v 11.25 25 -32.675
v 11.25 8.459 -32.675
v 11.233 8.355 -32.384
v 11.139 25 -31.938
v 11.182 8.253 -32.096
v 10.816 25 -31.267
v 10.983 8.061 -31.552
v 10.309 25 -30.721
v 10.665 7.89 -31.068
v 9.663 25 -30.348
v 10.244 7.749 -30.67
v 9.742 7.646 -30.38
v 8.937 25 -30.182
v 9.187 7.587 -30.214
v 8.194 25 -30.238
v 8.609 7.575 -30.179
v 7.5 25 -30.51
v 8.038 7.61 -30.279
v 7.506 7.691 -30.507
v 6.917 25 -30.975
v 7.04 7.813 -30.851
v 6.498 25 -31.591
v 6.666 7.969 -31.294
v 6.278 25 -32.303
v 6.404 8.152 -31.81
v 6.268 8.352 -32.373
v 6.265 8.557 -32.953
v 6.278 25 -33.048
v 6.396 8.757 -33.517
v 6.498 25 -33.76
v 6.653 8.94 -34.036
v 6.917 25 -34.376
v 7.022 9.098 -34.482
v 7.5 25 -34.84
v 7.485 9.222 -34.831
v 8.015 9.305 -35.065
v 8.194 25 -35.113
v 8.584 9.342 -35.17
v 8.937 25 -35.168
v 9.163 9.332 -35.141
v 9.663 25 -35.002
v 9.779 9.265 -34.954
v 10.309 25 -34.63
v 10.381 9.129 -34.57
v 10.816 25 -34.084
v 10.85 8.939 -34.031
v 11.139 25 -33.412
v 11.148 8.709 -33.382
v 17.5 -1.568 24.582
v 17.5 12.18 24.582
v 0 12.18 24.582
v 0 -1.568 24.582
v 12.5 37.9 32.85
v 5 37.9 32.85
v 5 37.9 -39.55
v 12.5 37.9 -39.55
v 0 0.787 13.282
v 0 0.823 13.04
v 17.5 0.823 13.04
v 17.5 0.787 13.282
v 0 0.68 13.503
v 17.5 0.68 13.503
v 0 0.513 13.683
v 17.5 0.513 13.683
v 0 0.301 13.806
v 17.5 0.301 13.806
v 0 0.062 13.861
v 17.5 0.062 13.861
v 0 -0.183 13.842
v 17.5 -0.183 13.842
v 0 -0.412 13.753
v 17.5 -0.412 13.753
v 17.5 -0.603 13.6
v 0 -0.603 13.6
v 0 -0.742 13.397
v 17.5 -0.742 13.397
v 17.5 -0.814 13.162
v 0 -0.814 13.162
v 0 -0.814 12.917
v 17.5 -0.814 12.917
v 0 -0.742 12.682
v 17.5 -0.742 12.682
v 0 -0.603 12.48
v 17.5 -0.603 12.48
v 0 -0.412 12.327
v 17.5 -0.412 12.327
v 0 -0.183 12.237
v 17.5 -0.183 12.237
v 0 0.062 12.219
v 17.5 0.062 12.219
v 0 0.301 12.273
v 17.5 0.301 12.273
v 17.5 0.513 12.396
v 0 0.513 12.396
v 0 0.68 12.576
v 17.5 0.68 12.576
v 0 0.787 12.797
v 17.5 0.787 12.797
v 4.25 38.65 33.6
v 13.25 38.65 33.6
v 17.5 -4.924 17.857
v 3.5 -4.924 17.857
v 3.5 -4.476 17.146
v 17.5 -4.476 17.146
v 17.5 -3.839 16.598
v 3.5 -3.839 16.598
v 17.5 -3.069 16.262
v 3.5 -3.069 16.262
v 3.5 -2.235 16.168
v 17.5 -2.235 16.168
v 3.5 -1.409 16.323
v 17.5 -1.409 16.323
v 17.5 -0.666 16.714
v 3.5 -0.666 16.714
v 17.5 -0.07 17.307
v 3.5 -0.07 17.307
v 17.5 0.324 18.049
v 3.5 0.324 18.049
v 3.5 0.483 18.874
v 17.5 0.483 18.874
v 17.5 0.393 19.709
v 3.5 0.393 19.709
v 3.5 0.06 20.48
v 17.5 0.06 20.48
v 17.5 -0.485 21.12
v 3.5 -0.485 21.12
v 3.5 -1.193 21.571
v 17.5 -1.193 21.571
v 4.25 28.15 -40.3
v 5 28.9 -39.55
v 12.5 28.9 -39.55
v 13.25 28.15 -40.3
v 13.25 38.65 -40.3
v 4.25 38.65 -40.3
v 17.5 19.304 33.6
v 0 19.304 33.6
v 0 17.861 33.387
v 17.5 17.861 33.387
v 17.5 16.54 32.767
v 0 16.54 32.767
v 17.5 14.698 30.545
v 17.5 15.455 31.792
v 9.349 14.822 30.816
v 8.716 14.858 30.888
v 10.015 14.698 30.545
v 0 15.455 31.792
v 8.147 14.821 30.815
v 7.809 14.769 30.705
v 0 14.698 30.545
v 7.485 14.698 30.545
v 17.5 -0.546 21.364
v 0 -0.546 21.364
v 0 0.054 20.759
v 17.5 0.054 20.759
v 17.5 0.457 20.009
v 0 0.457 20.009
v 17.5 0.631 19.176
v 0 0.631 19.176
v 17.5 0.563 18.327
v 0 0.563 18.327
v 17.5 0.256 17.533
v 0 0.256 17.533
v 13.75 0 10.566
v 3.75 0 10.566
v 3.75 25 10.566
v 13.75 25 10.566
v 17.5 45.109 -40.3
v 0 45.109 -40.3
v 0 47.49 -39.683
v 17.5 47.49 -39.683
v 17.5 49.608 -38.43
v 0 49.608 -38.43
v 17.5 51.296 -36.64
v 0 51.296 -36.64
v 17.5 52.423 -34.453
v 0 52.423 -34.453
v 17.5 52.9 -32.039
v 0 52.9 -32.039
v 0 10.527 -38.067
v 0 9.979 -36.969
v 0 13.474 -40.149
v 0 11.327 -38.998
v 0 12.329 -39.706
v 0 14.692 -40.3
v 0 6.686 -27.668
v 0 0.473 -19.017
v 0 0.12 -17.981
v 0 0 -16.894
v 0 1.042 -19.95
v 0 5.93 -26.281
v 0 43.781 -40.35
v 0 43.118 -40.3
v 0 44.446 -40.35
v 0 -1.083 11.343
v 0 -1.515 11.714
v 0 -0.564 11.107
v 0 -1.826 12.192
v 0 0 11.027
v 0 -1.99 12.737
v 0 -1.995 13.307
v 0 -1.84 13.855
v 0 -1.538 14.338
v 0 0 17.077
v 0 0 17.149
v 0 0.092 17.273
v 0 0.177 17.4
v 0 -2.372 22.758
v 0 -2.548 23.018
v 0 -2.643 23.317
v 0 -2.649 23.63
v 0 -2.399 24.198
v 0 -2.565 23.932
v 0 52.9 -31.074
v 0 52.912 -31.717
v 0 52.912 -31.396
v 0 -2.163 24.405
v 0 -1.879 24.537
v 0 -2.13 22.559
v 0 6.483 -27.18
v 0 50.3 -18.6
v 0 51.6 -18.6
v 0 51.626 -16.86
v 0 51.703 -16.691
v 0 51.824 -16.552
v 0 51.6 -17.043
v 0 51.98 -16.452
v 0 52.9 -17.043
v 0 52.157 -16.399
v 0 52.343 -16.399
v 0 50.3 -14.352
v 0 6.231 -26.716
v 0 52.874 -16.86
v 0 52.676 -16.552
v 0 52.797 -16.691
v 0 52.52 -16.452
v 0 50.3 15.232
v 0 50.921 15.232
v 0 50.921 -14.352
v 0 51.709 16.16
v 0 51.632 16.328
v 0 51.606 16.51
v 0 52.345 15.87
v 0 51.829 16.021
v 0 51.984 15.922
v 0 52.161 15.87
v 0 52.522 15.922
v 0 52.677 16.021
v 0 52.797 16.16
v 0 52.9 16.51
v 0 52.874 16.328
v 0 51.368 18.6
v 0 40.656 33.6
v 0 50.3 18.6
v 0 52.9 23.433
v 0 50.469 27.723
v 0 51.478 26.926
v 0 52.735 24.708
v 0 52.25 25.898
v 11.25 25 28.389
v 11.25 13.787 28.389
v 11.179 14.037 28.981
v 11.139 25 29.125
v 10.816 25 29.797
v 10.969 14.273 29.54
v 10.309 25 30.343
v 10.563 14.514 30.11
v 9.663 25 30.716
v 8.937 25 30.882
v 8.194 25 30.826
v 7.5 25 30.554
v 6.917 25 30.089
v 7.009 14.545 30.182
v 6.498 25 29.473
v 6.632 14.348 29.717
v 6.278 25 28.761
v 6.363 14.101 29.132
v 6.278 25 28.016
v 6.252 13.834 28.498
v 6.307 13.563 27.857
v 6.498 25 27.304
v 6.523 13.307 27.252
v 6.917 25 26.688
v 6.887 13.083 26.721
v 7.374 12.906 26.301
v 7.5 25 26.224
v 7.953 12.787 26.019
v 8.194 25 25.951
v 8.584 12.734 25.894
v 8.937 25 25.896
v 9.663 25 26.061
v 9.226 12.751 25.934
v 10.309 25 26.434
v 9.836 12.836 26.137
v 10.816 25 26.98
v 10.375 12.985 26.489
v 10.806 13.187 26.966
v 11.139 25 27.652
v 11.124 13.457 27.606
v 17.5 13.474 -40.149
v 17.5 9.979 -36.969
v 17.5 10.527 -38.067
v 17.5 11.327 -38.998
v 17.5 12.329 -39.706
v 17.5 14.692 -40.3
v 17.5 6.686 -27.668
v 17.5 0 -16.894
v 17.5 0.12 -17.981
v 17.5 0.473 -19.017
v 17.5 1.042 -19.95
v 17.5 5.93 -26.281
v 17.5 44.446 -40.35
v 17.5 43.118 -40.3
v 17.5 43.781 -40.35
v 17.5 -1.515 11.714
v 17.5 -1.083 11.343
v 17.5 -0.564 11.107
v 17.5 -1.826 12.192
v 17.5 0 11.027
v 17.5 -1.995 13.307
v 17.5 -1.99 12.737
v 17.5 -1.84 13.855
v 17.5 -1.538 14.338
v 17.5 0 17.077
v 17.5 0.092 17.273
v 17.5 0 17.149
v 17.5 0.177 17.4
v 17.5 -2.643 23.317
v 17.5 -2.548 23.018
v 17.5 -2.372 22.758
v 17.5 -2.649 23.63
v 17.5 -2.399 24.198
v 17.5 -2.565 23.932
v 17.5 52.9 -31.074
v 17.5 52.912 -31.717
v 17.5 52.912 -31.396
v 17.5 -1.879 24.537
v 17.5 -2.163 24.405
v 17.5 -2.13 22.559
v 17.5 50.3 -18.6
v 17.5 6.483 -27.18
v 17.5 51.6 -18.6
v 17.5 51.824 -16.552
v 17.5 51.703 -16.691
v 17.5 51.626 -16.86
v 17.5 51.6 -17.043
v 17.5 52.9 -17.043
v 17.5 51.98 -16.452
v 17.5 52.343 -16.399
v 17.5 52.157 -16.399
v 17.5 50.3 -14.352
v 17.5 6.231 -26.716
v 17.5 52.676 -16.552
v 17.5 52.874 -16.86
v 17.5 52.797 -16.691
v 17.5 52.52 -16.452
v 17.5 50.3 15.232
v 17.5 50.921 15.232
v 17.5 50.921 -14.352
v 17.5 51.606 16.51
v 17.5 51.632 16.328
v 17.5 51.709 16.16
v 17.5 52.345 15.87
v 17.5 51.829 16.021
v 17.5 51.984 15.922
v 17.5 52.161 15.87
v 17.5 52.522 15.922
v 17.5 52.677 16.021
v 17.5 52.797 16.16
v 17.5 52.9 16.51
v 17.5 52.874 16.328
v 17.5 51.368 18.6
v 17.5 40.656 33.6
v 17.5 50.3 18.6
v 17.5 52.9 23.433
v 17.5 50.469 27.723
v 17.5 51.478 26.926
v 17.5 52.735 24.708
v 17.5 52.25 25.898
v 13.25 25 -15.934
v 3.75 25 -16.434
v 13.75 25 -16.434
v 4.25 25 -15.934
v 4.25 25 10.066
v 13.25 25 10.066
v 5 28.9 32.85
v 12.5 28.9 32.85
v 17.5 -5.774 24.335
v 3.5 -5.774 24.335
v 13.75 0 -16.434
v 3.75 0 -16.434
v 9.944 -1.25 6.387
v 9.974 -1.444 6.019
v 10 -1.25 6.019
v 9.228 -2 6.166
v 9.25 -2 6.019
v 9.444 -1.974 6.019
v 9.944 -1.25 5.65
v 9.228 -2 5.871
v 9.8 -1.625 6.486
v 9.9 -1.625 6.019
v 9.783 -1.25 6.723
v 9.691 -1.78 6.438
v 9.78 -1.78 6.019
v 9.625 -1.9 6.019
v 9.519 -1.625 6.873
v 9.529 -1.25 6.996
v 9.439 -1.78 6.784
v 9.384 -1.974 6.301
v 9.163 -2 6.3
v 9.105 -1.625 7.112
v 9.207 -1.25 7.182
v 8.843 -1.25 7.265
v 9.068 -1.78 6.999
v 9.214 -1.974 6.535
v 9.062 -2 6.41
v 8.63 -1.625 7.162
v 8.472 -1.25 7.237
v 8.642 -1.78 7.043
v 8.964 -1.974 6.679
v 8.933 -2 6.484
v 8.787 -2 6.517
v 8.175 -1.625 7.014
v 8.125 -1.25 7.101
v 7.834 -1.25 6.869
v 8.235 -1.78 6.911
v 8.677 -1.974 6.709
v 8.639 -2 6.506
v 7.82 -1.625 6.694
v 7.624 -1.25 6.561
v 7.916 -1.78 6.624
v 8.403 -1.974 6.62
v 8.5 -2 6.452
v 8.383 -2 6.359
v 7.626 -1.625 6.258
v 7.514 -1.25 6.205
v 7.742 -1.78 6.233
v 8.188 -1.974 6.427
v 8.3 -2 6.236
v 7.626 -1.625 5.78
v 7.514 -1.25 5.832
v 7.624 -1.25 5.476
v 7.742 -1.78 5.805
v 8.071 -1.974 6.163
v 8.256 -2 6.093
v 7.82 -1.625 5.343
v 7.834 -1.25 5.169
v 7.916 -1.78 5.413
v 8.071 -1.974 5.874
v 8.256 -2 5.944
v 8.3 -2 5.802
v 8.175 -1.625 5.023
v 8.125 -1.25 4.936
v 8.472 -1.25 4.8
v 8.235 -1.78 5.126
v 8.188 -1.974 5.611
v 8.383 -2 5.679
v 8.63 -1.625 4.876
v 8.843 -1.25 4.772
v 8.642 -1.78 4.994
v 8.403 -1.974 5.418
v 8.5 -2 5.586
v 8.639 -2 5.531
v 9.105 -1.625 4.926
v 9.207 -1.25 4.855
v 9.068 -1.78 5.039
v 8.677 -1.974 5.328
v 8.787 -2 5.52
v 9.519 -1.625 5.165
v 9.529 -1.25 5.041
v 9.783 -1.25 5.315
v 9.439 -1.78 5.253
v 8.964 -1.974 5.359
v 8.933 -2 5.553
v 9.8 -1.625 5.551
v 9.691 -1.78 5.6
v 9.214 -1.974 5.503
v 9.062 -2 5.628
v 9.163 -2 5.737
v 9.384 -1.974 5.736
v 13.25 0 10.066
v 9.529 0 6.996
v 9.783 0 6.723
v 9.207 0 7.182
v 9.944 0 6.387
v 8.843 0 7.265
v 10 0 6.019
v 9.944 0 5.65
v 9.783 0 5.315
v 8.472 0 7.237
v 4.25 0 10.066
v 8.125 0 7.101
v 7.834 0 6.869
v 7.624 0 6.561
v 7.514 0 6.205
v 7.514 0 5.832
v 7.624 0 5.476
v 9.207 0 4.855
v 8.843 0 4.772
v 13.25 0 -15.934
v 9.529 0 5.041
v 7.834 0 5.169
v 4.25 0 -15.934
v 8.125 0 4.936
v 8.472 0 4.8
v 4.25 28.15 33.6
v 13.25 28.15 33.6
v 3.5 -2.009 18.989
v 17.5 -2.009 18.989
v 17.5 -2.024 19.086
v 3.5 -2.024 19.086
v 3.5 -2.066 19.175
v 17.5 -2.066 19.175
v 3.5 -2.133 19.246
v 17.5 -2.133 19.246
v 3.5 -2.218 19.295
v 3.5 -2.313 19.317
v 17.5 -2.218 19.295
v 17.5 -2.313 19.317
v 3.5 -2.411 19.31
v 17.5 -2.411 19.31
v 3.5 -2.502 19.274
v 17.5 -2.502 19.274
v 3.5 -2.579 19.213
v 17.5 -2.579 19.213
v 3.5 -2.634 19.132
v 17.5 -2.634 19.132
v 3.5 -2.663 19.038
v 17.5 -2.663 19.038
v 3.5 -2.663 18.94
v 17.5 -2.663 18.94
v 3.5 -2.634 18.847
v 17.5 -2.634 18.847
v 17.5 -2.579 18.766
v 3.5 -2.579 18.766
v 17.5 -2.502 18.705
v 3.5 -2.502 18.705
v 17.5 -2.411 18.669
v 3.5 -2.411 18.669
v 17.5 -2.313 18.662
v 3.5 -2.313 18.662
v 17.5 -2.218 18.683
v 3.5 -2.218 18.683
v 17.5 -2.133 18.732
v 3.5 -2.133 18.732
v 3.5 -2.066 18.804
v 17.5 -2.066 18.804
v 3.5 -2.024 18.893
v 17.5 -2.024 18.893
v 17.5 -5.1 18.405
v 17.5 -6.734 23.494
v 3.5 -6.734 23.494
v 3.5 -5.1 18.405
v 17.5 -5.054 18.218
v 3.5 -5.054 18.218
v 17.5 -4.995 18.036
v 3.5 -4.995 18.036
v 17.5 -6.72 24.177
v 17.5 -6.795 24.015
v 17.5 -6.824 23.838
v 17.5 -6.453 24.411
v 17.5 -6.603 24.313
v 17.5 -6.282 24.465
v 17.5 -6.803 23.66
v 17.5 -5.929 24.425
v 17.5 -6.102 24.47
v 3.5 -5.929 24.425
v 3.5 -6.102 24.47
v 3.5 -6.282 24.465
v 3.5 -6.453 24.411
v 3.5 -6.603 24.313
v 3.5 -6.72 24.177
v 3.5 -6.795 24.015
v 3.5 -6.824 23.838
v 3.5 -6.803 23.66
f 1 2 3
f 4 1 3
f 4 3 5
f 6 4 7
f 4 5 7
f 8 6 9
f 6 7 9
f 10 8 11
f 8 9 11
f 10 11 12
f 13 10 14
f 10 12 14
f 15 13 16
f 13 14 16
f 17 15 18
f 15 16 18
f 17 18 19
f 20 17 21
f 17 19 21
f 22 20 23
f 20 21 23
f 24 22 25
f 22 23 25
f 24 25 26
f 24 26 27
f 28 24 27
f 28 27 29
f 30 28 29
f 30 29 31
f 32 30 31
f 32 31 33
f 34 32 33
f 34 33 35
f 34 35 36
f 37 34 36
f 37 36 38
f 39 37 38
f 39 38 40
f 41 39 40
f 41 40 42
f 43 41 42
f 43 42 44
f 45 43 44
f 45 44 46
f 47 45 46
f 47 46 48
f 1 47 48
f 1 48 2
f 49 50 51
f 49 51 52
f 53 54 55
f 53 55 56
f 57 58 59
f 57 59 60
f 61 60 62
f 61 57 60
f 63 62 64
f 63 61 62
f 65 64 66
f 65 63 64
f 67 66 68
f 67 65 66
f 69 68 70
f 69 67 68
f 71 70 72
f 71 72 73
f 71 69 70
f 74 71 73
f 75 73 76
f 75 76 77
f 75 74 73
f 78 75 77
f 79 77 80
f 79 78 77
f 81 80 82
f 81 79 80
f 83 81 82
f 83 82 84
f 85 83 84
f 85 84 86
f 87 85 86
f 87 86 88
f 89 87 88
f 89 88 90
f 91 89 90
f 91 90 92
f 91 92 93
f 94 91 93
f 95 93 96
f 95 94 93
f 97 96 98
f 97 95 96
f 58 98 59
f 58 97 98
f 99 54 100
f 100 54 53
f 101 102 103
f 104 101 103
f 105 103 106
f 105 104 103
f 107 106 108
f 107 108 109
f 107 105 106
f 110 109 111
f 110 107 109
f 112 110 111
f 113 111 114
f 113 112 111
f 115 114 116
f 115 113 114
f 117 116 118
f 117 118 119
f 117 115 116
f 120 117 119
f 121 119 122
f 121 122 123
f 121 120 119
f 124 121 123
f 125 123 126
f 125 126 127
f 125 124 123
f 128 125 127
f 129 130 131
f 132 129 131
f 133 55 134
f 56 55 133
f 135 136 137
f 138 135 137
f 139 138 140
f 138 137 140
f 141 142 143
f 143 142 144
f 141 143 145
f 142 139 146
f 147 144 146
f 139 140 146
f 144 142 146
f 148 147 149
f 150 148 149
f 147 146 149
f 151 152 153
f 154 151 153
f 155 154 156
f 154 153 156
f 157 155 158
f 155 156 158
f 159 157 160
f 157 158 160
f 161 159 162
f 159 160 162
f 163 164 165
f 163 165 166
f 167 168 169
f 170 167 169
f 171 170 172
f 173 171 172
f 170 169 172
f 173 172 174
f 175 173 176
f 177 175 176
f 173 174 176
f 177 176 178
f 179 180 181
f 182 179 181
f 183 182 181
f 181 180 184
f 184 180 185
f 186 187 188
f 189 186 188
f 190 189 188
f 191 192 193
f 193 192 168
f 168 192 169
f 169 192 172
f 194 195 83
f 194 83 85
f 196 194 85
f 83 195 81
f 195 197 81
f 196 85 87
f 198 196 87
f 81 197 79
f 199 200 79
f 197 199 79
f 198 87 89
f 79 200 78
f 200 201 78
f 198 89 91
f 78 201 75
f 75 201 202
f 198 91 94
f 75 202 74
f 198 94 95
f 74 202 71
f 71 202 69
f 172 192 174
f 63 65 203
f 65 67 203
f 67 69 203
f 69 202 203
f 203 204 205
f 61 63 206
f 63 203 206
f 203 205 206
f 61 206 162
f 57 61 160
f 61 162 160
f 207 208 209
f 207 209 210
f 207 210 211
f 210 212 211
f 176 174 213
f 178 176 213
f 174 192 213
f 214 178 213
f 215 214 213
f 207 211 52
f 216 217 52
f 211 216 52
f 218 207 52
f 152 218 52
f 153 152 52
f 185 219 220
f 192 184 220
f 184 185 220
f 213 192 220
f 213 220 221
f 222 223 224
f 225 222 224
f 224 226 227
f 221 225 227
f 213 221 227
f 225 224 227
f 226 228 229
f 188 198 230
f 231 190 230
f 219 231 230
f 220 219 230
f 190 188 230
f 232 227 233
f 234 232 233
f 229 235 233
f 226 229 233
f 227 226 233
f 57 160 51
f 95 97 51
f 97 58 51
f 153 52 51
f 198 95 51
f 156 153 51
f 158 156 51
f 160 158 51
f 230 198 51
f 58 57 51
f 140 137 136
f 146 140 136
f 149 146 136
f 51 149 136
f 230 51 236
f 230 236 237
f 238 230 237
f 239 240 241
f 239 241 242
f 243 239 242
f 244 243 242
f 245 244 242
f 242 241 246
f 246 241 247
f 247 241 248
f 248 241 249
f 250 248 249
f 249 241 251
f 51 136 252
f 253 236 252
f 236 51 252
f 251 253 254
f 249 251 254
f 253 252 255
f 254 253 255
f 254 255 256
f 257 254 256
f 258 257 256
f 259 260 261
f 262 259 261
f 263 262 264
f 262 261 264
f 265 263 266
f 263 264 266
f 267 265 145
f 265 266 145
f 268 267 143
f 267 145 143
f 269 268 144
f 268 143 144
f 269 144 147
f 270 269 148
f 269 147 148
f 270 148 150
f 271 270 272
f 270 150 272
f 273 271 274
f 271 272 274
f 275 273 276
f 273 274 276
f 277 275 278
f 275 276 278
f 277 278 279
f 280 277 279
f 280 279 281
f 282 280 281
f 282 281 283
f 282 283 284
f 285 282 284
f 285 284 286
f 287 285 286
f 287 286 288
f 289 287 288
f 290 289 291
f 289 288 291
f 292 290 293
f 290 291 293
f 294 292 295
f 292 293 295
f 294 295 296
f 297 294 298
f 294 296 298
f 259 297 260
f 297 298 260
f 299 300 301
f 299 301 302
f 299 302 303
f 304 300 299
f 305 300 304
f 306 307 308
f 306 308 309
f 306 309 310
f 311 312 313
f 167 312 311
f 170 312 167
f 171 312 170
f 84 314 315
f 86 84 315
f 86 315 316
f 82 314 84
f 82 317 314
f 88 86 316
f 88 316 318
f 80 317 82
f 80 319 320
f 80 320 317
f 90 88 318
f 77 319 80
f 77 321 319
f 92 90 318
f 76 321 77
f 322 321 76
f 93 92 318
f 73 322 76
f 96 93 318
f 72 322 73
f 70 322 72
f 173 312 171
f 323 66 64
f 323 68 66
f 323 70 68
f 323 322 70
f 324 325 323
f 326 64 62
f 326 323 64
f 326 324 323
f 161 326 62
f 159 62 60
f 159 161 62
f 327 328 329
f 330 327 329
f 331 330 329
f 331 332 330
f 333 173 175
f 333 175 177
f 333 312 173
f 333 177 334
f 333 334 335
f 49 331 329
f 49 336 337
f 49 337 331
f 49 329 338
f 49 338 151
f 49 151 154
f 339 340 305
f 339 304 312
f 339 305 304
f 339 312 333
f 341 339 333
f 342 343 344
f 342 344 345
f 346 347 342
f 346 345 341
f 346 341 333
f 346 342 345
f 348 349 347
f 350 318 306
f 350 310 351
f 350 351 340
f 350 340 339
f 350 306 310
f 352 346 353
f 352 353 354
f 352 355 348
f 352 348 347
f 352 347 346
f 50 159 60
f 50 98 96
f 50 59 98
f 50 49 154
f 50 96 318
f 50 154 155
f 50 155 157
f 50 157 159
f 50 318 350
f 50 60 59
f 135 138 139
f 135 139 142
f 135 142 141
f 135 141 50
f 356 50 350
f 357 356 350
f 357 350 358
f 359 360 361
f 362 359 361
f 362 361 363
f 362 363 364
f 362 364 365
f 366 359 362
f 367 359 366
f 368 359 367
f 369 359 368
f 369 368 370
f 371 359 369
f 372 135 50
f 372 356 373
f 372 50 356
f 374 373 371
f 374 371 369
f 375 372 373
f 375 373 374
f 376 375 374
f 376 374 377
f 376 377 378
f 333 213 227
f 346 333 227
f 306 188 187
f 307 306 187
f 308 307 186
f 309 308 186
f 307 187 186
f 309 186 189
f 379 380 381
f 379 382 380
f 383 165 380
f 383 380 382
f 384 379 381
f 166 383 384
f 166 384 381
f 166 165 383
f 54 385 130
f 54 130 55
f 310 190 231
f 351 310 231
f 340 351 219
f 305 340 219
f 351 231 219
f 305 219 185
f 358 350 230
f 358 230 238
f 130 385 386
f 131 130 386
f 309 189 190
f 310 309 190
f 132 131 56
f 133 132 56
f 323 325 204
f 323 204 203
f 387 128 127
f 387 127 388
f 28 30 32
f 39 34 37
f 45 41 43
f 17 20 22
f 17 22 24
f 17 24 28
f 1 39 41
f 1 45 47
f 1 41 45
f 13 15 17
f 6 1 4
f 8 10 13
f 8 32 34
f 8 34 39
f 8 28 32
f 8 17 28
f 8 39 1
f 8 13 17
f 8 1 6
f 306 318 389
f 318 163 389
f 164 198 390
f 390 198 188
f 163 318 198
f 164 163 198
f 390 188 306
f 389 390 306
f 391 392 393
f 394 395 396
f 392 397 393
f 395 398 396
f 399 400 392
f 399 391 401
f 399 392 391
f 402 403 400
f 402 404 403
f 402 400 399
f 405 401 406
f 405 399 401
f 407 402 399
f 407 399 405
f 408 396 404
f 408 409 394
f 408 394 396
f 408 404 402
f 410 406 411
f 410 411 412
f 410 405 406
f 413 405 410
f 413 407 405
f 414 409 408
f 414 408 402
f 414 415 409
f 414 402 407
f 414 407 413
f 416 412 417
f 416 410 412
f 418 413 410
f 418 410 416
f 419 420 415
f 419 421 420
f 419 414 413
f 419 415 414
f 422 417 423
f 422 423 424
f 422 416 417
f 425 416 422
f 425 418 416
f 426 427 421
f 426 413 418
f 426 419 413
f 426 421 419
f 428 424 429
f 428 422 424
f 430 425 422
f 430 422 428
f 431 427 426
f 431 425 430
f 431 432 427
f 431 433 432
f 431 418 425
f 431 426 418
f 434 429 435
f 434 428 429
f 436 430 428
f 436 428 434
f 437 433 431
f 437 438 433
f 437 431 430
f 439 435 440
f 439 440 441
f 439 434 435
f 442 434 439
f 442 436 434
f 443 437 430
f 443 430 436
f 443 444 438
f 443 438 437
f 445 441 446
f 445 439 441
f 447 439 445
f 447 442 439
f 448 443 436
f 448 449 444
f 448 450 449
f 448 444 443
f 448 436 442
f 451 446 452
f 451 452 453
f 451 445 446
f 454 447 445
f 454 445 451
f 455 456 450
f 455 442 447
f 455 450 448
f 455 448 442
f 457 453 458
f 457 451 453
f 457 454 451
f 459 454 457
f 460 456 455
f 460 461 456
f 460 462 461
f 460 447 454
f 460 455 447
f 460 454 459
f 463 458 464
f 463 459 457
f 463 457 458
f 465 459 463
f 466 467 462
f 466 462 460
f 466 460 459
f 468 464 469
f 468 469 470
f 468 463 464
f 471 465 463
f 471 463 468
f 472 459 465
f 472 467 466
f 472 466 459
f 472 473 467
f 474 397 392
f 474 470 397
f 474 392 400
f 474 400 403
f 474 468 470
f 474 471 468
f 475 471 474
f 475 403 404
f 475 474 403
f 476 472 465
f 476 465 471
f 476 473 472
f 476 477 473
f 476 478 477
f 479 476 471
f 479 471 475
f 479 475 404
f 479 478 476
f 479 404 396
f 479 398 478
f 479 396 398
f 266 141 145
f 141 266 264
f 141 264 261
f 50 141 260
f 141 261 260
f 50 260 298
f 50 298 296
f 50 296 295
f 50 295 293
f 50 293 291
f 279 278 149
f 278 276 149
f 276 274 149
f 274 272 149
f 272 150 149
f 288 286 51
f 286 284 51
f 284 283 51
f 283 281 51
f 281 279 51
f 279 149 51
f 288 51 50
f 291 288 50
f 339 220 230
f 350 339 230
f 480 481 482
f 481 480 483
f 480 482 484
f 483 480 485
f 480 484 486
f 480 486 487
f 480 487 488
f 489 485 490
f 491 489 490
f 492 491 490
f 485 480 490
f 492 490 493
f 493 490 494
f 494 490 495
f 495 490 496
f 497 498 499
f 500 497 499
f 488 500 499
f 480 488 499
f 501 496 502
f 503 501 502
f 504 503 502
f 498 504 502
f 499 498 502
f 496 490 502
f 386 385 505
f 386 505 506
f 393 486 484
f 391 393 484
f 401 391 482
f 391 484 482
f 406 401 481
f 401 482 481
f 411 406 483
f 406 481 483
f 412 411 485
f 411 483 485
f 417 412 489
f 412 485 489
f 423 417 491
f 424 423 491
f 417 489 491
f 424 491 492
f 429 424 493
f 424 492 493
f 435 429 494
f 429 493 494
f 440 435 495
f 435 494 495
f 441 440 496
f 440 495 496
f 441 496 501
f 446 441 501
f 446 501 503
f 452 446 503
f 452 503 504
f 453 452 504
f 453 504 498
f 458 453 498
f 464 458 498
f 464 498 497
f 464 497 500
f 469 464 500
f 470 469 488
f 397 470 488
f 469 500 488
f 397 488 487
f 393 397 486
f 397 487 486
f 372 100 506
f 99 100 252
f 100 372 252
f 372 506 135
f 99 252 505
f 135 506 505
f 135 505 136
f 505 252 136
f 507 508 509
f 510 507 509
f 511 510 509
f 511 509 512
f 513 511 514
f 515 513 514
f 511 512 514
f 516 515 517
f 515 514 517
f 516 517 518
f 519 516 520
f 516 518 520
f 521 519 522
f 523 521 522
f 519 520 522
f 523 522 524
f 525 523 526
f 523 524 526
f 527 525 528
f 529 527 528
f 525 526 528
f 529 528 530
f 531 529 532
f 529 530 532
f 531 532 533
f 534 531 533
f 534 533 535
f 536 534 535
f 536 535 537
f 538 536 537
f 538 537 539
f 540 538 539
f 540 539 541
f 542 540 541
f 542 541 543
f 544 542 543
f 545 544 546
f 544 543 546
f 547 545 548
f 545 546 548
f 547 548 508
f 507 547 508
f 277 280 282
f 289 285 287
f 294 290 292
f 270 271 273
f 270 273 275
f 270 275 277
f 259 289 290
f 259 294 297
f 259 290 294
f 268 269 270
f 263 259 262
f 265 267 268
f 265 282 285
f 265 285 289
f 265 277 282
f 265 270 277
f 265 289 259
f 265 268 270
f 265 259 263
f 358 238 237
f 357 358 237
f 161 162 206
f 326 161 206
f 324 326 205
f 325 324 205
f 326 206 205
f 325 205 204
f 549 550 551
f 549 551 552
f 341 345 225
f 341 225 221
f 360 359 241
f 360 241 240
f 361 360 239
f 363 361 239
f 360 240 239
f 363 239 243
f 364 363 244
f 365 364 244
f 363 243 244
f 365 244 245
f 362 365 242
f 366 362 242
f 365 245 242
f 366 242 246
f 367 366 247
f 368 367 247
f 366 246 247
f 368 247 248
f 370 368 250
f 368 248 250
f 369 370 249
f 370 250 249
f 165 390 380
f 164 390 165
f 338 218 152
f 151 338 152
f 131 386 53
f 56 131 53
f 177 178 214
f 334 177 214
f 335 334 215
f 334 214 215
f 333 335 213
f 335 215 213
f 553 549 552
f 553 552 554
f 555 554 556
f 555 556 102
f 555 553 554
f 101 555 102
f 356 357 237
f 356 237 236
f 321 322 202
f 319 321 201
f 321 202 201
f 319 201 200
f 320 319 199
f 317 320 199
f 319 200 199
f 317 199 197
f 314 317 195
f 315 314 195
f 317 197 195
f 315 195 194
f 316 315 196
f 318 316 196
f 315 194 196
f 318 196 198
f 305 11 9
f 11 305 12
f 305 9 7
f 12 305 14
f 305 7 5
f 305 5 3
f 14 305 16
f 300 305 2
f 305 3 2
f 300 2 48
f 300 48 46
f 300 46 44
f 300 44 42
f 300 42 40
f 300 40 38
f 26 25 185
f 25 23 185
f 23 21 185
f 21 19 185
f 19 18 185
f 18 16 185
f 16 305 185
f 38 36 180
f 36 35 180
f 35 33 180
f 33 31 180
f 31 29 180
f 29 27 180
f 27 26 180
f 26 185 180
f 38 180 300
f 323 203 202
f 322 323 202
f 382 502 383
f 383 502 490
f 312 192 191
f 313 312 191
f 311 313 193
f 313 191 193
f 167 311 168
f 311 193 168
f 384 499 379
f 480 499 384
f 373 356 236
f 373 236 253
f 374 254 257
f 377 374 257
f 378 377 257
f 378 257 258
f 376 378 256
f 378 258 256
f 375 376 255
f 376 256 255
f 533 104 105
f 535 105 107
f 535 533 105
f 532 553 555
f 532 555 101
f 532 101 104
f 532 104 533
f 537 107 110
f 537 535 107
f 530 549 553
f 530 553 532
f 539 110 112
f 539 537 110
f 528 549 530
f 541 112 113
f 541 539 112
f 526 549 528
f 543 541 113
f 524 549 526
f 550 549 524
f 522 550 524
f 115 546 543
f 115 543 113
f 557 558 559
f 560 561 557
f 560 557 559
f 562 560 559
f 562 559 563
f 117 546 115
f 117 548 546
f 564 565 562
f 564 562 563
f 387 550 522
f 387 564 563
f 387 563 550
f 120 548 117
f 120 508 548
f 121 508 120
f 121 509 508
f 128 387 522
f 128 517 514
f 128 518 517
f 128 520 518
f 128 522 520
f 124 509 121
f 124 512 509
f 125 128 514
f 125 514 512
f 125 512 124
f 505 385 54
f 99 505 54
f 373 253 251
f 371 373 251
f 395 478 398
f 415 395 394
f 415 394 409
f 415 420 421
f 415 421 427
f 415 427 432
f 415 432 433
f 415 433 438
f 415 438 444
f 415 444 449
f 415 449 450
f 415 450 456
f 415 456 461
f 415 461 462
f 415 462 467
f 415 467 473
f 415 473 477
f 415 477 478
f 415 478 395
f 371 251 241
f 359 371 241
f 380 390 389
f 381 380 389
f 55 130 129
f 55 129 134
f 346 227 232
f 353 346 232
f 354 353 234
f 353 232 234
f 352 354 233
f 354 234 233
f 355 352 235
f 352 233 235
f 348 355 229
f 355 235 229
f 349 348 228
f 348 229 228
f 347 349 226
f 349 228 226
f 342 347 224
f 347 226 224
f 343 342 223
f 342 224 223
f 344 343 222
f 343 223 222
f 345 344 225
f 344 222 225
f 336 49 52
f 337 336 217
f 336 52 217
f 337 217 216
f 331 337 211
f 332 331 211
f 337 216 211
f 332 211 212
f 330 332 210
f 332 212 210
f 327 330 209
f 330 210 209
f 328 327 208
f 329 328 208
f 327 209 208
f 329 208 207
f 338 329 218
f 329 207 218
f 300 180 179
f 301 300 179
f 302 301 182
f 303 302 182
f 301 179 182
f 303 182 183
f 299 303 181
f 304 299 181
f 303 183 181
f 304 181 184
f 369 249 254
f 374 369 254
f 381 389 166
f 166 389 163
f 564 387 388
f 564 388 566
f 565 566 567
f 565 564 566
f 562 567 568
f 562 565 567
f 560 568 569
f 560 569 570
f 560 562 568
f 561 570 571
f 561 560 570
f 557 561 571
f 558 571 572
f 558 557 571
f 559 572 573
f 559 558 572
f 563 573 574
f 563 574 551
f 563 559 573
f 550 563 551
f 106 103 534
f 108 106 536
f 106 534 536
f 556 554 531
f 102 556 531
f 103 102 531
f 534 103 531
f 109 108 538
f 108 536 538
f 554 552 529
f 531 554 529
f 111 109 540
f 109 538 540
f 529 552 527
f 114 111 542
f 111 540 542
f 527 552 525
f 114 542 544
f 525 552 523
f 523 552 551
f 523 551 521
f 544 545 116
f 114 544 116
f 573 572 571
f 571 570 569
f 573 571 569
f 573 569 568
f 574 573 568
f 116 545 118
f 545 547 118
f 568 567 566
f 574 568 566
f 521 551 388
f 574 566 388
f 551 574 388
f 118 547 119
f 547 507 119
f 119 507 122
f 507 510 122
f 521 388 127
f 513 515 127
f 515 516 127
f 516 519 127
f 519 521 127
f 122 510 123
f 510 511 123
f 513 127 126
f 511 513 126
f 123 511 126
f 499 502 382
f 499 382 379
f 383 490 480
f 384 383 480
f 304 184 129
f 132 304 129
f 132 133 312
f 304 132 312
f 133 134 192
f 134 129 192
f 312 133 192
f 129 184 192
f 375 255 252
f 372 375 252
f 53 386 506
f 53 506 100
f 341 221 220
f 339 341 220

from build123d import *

# Parameters (mm, degrees)
F0_R      = 0.823257
F1_DEPTH  = 17.5
F2_R      = 0.328676
F3_DEPTH  = 14
F4_W      = 7.5
F4_H      = 9
F5_DEPTH  = 73.957461
F6_R      = 2.5
F7_DEPTH  = 25
F8_W      = 10
F8_H      = 27
F8_W_2    = 9
F8_H_2    = 26
F9_DEPTH  = 25
F10_R     = 1.25
F11_DEPTH = 2
F12_R     = 0.75
F13_SIZE  = 0.75


with BuildPart() as f1:
    # F0 (on Right) → F1 (new body)
    with BuildSketch(Plane.YZ):
        with BuildLine():
            Line((0, 11.026559), (0, 0))
            Line((0, 0), (0, -16.894456))
            ThreePointArc((0, -16.894456), (0.267738, -18.508672), (1.042278, -19.950014))
            Line((1.042278, -19.950014), (5.930145, -26.281039))
            ThreePointArc((5.930145, -26.281039), (6.363045, -26.944435), (6.685741, -27.667874))
            Line((6.685741, -27.667874), (9.978654, -36.968724))
            ThreePointArc((9.978654, -36.968724), (11.806111, -39.383113), (14.691972, -40.3))
            Line((14.691972, -40.3), (43.11803, -40.3))
            Line((43.11803, -40.3), (45.108521, -40.3))
            ThreePointArc((45.108521, -40.3), (50.515014, -37.594471), (52.9, -32.039123))
            Line((52.9, -32.039123), (52.9, -31.073859))
            Line((52.9, -31.073859), (52.9, -18.6))
            Line((52.9, -18.6), (51.6, -18.6))
            Line((51.6, -18.6), (50.3, -18.6))
            Line((50.3, -18.6), (50.3, -14.351867))
            Line((50.3, -14.351867), (50.921366, -14.351867))
            Line((50.921366, -14.351867), (50.921366, 15.232199))
            Line((50.921366, 15.232199), (50.3, 15.232199))
            Line((50.3, 15.232199), (50.3, 18.6))
            Line((50.3, 18.6), (51.368345, 18.6))
            Line((51.368345, 18.6), (51.606093, 16.510101))
            ThreePointArc((51.606093, 16.510101), (52.253046, 15.863147), (52.9, 16.510101))
            Line((52.9, 16.510101), (52.9, 23.433136))
            ThreePointArc((52.9, 23.433136), (52.250031, 25.898339), (50.469108, 27.722621))
            Line((50.469108, 27.722621), (40.656004, 33.6))
            Line((40.656004, 33.6), (19.304, 33.6))
            ThreePointArc((19.304, 33.6), (16.540417, 32.766846), (14.69783, 30.545043))
            Line((14.69783, 30.545043), (12.179947, 24.582295))
            Line((12.179947, 24.582295), (0, 24.582295))
            Line((0, 24.582295), (-1.568257, 24.582295))
            ThreePointArc((-1.568257, 24.582295), (-2.617973, 23.784237), (-2.129711, 22.559329))
            Line((-2.129711, 22.559329), (-0.545796, 21.364181))
            ThreePointArc((-0.545796, 21.364181), (0.574179, 19.598821), (0.256078, 17.532508))
            Line((0.256078, 17.532508), (0, 17.076621))
            Line((0, 17.076621), (-1.538252, 14.338122))
            ThreePointArc((-1.538252, 14.338122), (-1.825696, 12.191554), (0, 11.026559))
        make_face()
        with Locations((0, 13.039607)):
            Circle(F0_R, mode=Mode.SUBTRACT)
        with BuildLine():
            Line((0, 17.149476), (0, 17.076621))
            Line((0, 17.076621), (0.256078, 17.532508))
            ThreePointArc((0.256078, 17.532508), (0.135465, 17.336027), (0, 17.149476))
        make_face()
        with BuildLine():
            Line((45.108521, -40.3), (43.11803, -40.3))
            ThreePointArc((43.11803, -40.3), (44.113275, -40.356461), (45.108521, -40.3))
        make_face()
        with BuildLine():
            Line((52.9, -31.073859), (52.9, -32.039123))
            ThreePointArc((52.9, -32.039123), (52.913245, -31.556491), (52.9, -31.073859))
        make_face()
        with BuildLine():
            Line((51.6, -18.6), (52.9, -18.6))
            Line((52.9, -18.6), (52.9, -17.042855))
            ThreePointArc((52.9, -17.042855), (52.25, -16.392855), (51.6, -17.042855))
            Line((51.6, -17.042855), (51.6, -18.6))
        make_face()
    extrude(amount=F1_DEPTH)

    # F4 (on face) → F5 (cut, through all)
    with BuildSketch(Plane.XY.offset(33.6)):
        with Locations((8.75, 33.4)):
            Rectangle(F4_W, F4_H)
    extrude(amount=-F5_DEPTH, mode=Mode.SUBTRACT)

    # F6 (on Front) → F7 (cut)
    with BuildSketch(Plane.XZ):
        with Locations((8.75, -32.675229)):
            Circle(F6_R)
        with Locations((8.75, 28.388606)):
            Circle(F6_R)
    extrude(amount=-F7_DEPTH, mode=Mode.SUBTRACT)

    # F8 (on face) → F9 (cut)
    with BuildSketch(Plane.XZ):
        with Locations((8.75, -2.933948)):
            Rectangle(F8_W, F8_H)
        with Locations((8.75, -2.933948)):
            Rectangle(F8_W_2, F8_H_2, mode=Mode.SUBTRACT)
    extrude(amount=-F9_DEPTH, mode=Mode.SUBTRACT)

    # F10 (on face) → F11 (join)
    with BuildSketch(Plane.XZ):
        with Locations((8.75, 6.018765)):
            Circle(F10_R)
    extrude(amount=F11_DEPTH)

    # F12
    f12_edges = [f1.edges().sort_by_distance(p)[0] for p in [
        (7.5, -2, 6.018765),
    ]]
    fillet(f12_edges, radius=F12_R)

    # F13
    f13_edges = [f1.edges().sort_by_distance(p)[0] for p in [
        (8.75, 37.9, -40.3),
        (12.5, 33.4, -40.3),
        (8.75, 28.9, -40.3),
        (5, 33.4, -40.3),
        (5, 33.4, 33.6),
        (8.75, 28.9, 33.6),
        (12.5, 33.4, 33.6),
        (8.75, 37.9, 33.6),
    ]]
    chamfer(f13_edges, length=F13_SIZE)


with BuildPart() as f3:
    # F2 (on face) → F3 (new body)
    with BuildSketch(Plane.YZ.offset(17.5)):
        with BuildLine():
            Line((-4.924123, 17.856974), (-5.10003, 18.404983))
            ThreePointArc((-5.10003, 18.404983), (-5.026076, 18.126485), (-4.924123, 17.856974))
        make_face()
        with BuildLine():
            Line((-6.73369, 23.494389), (-5.10003, 18.404983))
            Line((-5.10003, 18.404983), (-4.924123, 17.856974))
            ThreePointArc((-4.924123, 17.856974), (-0.3457, 16.988353), (-1.193371, 21.570701))
            Line((-1.193371, 21.570701), (-5.773895, 24.335074))
            ThreePointArc((-5.773895, 24.335074), (-6.602514, 24.31286), (-6.73369, 23.494389))
        make_face()
        with Locations((-2.337661, 18.989446)):
            Circle(F2_R, mode=Mode.SUBTRACT)
    extrude(amount=-F3_DEPTH)


solid = Compound([f1.part, f3.part])
